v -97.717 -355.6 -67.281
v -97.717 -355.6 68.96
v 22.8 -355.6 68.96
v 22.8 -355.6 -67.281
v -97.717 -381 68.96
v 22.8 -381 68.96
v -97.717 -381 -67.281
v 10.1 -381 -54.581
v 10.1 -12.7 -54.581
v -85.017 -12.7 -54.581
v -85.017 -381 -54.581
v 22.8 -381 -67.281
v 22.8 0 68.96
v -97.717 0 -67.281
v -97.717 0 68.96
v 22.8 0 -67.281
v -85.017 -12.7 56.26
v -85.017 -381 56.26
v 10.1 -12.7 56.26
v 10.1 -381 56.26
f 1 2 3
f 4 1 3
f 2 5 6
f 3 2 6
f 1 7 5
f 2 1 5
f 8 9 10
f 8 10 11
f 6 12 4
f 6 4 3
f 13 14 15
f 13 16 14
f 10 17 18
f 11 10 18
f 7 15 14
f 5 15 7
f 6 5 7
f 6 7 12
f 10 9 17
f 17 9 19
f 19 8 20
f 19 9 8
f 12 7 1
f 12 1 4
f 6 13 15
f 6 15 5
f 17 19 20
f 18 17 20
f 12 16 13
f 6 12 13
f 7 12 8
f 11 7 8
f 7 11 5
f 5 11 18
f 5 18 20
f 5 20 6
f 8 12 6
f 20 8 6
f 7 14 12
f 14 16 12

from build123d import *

# Parameters (mm, degrees)
F0_W      = 95.116782
F0_H      = 136.240802
F1_DEPTH  = 381
F1_FACE_W = 381
F1_FACE_H = 136.240802
F2_DEPTH  = 25.4
F2_FACE_W = 120.516782
F2_FACE_H = 136.240802
F3_DEPTH  = 25.4
F4_T      = -12.7


with BuildPart() as f1:
    # F0 (on Front) → F1 (new body)
    with BuildSketch(Plane.XZ):
        with Locations((-24.758338, 0.839267)):
            Rectangle(F0_W, F0_H)
    extrude(amount=F1_DEPTH)

    # F1_face (on face) → F2 (join)
    with BuildSketch(Plane(origin=(-72.316729, -190.5, 0.839267), x_dir=(0, -1, 0), z_dir=(-1, 0, 0))):
        Rectangle(F1_FACE_W, F1_FACE_H)
    extrude(amount=F2_DEPTH)

    # F4
    f4_openings = [f1.faces().sort_by_distance(p)[0] for p in [
        (-37.458338, -381, 0.839267),
    ]]
    offset(amount=F4_T, openings=f4_openings)


with BuildPart() as f3:
    # F2_face (on face) → F3 (new body)
    with BuildSketch(Plane(origin=(-37.458338, -381, 0.839267), x_dir=(1, 0, 0), z_dir=(0, -1, 0))):
        Rectangle(F2_FACE_W, F2_FACE_H)
    extrude(amount=-F3_DEPTH)


solid = Compound([f1.part, f3.part])
